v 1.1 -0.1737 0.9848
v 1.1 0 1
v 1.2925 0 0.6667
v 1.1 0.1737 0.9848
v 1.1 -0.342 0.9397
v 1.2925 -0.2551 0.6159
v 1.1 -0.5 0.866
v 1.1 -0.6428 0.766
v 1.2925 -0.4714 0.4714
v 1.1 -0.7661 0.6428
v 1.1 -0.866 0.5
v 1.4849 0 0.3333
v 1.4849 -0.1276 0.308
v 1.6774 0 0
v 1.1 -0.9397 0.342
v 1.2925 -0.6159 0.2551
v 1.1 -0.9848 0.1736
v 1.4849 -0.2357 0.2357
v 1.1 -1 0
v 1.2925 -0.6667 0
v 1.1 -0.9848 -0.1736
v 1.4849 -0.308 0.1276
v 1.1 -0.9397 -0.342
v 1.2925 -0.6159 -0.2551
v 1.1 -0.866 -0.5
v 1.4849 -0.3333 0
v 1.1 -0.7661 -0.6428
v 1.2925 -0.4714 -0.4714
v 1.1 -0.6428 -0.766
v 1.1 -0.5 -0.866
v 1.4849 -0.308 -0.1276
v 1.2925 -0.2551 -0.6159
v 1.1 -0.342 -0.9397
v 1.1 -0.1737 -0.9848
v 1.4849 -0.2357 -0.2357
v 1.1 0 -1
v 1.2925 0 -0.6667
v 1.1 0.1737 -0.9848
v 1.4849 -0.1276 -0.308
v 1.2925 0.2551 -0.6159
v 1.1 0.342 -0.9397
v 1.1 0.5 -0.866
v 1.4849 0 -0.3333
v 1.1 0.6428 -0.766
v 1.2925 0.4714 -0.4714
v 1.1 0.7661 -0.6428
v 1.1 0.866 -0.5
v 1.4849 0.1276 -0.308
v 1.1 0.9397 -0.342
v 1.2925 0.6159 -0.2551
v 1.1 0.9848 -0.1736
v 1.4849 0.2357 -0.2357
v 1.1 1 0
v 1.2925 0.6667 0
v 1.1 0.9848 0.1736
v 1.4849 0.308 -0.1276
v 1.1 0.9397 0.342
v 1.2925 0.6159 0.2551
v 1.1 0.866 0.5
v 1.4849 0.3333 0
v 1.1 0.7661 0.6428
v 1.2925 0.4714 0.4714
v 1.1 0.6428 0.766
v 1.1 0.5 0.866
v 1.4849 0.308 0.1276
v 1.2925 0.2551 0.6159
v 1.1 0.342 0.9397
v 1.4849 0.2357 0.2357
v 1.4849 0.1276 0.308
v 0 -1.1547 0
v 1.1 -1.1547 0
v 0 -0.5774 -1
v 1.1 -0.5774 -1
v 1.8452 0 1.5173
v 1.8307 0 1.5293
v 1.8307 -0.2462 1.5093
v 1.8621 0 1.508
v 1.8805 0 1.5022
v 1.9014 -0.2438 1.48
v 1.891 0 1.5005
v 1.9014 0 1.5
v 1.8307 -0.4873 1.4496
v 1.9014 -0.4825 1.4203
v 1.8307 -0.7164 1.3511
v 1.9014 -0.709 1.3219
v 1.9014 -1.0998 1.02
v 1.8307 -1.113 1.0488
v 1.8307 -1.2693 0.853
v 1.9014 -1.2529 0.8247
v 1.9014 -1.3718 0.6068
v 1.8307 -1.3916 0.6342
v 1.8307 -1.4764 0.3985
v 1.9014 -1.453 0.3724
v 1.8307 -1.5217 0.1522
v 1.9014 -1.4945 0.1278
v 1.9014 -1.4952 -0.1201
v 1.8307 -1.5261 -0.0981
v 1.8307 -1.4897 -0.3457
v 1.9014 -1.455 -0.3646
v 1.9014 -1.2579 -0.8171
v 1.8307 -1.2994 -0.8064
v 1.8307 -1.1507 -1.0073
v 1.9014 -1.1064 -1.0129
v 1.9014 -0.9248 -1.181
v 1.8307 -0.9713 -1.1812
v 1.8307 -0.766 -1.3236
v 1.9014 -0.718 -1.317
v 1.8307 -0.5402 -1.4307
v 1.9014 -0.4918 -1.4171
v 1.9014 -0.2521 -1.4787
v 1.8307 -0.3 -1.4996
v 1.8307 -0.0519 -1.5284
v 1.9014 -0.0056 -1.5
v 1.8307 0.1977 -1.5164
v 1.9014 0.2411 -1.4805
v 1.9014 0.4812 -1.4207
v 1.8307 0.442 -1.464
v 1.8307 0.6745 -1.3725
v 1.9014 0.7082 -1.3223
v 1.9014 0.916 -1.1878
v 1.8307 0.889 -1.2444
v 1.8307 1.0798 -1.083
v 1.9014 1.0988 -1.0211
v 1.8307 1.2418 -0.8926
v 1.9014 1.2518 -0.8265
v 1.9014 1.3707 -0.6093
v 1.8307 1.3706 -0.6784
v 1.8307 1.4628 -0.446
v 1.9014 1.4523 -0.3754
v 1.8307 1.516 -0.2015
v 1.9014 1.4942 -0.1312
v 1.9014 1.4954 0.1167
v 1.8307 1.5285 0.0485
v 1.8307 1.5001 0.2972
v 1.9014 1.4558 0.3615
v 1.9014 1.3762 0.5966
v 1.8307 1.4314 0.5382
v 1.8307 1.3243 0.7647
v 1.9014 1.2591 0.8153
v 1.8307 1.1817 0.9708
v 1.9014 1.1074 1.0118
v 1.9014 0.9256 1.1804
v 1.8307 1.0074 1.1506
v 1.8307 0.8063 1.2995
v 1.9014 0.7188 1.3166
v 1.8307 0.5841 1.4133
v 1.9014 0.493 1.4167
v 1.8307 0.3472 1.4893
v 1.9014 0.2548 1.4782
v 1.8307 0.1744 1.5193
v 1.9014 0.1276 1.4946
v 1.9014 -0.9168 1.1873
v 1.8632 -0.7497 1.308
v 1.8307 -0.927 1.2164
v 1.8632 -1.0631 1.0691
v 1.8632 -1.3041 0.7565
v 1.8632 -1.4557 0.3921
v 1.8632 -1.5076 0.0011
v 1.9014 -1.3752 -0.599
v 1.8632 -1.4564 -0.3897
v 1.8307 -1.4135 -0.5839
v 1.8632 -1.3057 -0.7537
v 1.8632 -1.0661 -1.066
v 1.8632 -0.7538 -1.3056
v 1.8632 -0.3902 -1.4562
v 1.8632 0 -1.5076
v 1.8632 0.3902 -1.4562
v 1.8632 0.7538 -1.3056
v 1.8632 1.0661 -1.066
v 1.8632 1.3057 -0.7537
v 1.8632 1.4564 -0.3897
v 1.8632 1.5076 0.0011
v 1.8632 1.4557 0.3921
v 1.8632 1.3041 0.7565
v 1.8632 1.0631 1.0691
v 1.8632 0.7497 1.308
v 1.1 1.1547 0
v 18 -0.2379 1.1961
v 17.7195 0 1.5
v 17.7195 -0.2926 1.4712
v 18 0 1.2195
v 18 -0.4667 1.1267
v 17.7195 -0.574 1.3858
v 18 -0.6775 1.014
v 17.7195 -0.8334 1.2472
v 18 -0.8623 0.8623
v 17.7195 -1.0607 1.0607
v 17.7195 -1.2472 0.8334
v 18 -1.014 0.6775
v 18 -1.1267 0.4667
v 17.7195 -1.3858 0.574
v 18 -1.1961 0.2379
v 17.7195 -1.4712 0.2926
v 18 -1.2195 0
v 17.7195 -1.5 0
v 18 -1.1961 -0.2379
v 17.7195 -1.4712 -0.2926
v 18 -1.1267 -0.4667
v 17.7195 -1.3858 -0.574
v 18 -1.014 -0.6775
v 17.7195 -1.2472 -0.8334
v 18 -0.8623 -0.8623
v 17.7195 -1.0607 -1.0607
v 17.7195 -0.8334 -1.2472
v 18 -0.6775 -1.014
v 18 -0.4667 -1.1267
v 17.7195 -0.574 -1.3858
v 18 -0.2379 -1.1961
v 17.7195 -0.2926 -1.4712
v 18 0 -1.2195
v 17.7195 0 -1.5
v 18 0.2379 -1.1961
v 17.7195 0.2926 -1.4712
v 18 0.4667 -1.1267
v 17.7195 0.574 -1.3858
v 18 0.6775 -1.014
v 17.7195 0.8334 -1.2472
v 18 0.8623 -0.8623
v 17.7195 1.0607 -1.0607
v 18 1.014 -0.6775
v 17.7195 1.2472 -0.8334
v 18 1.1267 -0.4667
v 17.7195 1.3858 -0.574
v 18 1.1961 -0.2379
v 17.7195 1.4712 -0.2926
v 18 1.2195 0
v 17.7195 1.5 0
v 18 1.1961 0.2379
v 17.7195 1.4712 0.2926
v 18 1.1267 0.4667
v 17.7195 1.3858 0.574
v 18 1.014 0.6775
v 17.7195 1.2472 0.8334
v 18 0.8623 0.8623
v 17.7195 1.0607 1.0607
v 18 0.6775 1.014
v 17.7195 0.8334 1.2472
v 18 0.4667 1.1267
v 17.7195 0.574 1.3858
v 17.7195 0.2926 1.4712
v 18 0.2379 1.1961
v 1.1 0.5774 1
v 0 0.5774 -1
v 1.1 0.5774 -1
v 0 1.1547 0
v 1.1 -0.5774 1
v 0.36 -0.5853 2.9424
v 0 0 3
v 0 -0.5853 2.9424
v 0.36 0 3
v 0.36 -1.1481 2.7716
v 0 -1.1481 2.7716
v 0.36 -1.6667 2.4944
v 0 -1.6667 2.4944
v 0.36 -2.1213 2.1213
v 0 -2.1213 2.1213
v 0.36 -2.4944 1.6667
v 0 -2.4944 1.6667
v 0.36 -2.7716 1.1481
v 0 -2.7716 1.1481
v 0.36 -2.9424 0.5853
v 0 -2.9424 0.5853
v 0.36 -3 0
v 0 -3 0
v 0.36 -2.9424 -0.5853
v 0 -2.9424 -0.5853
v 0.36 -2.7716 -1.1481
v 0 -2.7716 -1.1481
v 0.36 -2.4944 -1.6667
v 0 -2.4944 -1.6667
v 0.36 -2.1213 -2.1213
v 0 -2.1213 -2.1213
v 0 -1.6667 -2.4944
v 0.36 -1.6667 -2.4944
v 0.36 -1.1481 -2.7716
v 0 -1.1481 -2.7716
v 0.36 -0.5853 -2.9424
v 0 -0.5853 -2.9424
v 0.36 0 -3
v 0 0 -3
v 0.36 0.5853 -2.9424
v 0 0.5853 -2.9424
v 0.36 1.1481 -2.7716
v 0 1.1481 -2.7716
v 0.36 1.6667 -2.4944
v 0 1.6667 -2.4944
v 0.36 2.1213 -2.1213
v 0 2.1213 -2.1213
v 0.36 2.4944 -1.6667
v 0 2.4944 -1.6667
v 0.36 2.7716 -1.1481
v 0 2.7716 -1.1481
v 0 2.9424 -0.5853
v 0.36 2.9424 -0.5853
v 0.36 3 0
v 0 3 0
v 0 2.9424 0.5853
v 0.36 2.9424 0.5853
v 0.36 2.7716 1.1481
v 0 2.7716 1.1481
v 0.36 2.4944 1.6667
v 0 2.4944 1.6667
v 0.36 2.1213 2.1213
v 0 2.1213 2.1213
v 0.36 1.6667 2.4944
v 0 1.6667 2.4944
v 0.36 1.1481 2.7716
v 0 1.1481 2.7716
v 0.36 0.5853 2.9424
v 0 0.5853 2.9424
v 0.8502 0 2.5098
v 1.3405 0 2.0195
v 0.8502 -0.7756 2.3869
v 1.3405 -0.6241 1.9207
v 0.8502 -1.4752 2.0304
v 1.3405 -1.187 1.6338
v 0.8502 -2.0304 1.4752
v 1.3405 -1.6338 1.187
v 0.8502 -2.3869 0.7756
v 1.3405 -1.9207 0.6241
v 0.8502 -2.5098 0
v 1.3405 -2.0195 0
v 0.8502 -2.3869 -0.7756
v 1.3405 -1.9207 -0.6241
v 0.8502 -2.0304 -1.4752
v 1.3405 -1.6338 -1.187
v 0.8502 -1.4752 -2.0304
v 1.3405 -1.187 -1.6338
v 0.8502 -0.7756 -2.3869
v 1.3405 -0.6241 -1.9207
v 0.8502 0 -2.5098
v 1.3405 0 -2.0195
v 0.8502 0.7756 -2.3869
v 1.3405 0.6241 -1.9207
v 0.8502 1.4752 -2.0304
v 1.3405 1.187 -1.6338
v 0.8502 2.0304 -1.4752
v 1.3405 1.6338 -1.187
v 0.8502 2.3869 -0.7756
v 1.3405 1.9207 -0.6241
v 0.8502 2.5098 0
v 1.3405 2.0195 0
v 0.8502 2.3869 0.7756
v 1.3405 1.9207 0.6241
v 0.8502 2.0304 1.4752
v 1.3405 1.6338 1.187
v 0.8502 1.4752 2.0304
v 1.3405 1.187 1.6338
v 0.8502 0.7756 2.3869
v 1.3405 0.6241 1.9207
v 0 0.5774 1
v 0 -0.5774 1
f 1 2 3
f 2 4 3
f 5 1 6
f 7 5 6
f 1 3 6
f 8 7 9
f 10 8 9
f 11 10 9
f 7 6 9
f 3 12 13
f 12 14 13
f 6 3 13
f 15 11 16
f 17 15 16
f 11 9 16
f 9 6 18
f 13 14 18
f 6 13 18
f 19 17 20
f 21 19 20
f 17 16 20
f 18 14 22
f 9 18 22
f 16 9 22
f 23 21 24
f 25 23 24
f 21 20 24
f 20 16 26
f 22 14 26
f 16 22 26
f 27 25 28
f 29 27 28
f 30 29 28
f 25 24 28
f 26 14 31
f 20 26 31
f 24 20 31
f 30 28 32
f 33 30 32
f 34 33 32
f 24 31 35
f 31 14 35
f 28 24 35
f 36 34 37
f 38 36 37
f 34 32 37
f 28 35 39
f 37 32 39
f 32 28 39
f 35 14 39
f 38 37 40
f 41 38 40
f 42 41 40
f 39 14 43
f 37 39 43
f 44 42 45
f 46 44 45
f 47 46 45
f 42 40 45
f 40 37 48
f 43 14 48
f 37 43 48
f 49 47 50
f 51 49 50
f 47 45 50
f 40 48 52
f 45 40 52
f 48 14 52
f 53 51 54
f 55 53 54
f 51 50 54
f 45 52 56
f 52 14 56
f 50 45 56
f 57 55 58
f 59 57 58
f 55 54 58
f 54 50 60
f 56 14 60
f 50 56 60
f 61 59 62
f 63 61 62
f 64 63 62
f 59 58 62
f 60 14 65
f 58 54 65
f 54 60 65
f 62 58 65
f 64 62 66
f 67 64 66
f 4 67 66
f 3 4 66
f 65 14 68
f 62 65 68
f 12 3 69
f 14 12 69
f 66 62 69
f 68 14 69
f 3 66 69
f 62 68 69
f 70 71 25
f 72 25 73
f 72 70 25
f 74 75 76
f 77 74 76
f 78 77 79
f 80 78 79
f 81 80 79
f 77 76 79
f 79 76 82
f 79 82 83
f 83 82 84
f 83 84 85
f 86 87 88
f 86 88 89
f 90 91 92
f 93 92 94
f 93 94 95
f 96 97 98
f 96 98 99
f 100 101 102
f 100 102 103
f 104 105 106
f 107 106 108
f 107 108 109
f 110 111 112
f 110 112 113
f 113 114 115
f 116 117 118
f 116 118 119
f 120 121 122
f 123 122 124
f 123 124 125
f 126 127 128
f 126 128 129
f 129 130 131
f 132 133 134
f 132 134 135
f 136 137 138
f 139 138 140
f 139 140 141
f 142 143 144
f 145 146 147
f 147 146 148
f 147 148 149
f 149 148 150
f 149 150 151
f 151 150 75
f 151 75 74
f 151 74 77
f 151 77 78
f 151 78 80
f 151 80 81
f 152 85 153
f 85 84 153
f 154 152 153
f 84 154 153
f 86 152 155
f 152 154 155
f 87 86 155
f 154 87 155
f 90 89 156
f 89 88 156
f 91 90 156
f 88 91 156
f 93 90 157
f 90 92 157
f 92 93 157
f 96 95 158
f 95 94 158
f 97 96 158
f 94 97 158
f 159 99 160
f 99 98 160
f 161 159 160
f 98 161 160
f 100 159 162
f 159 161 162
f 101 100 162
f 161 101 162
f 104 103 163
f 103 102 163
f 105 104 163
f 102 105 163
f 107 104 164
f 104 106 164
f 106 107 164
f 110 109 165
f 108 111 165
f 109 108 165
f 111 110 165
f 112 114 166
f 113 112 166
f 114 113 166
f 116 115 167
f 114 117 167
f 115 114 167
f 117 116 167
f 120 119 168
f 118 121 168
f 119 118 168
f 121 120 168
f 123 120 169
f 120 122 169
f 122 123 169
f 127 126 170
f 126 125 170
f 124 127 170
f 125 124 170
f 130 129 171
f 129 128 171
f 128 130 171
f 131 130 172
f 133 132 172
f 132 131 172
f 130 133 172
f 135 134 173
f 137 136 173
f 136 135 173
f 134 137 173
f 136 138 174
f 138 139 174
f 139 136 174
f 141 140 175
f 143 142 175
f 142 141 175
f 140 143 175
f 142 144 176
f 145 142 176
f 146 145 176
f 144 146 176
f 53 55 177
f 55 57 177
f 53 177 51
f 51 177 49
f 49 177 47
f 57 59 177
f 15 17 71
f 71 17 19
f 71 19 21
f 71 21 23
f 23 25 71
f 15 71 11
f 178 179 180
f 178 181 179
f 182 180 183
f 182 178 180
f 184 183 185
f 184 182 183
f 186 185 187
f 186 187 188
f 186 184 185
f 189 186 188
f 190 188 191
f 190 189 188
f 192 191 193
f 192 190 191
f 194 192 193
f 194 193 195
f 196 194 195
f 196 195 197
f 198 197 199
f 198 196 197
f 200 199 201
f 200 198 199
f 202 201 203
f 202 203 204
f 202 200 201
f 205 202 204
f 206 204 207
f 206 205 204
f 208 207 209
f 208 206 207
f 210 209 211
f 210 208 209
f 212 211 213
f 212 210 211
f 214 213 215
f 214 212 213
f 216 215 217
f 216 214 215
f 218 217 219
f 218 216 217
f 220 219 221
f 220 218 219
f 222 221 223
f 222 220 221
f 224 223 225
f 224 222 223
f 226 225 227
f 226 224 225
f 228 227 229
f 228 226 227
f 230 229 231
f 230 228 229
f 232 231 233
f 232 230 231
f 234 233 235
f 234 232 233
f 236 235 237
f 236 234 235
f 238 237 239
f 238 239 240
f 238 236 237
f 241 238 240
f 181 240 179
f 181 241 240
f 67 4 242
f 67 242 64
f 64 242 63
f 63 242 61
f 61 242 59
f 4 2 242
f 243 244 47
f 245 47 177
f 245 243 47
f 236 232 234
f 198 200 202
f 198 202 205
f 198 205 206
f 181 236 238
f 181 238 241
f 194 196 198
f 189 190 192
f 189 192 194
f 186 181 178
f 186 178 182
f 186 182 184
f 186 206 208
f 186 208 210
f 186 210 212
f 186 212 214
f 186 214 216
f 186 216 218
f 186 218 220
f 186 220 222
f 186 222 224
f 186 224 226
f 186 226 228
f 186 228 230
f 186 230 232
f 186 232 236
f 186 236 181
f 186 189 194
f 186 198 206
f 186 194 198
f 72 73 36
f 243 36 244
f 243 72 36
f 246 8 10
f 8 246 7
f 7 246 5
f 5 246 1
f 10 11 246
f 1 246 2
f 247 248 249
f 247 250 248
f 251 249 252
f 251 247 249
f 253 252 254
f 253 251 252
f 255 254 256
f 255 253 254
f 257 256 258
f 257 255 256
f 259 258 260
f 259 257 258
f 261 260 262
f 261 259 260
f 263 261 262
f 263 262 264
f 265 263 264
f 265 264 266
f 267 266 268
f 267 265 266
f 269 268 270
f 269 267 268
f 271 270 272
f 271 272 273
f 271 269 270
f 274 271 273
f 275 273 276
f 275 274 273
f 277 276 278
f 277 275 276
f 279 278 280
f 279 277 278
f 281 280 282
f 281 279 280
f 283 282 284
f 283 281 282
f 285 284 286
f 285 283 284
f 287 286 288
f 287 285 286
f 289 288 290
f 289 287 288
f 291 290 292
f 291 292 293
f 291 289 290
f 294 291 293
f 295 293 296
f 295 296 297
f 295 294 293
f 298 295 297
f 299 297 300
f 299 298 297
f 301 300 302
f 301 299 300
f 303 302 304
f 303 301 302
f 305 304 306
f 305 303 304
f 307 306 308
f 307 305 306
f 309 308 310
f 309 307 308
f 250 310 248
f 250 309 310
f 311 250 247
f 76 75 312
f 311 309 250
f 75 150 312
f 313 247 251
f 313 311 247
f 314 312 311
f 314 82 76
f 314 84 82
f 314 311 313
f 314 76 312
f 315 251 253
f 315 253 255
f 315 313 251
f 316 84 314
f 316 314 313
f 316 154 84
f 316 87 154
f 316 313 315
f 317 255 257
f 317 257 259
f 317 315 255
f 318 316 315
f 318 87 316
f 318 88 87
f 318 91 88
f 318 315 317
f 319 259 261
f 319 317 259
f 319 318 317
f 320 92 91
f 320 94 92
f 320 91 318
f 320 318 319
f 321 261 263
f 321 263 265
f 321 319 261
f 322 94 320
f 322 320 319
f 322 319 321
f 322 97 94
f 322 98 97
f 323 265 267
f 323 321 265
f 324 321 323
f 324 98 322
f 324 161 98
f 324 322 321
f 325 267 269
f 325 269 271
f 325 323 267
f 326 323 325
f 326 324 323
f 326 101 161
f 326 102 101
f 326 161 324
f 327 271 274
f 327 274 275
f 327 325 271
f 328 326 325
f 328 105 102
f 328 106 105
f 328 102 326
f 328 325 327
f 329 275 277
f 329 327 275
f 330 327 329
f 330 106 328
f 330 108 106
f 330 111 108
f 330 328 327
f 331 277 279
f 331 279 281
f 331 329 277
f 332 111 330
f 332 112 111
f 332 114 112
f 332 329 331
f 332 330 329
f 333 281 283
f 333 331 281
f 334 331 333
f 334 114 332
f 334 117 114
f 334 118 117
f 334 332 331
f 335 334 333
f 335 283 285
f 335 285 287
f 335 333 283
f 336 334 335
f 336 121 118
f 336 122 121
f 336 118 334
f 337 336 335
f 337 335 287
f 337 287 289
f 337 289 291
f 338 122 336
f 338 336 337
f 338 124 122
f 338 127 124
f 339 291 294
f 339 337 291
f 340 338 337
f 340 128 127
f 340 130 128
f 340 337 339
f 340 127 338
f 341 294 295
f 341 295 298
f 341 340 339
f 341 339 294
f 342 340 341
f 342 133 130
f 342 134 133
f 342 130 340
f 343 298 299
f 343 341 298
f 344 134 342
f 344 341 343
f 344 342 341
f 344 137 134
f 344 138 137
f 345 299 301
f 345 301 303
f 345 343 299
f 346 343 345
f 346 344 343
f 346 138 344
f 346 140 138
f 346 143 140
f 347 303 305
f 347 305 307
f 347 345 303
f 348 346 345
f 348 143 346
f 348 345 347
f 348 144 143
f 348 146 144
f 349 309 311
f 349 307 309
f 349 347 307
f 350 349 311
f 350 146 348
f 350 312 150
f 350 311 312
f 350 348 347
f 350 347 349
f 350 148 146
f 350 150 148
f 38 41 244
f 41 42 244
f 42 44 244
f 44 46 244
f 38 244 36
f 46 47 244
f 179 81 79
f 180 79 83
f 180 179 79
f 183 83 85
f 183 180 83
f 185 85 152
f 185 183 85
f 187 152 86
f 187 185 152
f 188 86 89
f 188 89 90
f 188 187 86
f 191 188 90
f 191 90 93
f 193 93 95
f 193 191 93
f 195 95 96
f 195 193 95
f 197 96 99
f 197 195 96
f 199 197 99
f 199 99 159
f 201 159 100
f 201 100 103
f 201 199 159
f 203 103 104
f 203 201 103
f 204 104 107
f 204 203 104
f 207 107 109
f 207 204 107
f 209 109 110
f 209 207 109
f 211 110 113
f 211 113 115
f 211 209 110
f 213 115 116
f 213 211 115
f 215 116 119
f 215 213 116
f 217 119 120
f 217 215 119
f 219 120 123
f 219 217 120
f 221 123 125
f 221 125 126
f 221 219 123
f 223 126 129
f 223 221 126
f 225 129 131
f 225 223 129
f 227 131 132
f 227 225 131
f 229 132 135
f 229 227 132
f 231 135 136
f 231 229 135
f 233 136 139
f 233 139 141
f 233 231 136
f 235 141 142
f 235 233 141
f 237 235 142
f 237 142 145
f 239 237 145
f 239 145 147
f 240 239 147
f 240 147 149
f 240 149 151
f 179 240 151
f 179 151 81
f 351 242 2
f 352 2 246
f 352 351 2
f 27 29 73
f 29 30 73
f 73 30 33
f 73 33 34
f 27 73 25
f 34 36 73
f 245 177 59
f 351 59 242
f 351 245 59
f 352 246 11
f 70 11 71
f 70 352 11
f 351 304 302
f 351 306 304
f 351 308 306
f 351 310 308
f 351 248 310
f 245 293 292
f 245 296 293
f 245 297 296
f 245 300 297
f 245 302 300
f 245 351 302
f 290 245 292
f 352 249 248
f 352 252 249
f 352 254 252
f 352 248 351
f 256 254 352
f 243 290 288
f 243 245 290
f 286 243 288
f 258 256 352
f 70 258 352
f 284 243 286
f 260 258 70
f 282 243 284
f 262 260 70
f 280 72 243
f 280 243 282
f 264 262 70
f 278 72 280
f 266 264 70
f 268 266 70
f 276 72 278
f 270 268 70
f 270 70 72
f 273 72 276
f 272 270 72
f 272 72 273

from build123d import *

# Parameters (mm, degrees)
FILLET1_R   = 0.1
HEX_2_DEPTH = 1.1


with BuildPart() as part:
    # BodySke → BaseBody (revolve)
    with BuildSketch(Plane.XY, mode=Mode.PRIVATE) as basebody_sk:
        Polygon((0, 0), (0, 3), (0.36, 3), (1.86, 1.5), (17.7195, 1.5), (18, 1.2195), (18, 0), align=None)
    revolve(basebody_sk.sketch.rotate(Axis((0, 0, 0), (1, 0, 0)), 90), axis=Axis((0, 0, 0), (1, 0, 0)))

    # Fillet1
    fillet1_edges = [part.edges().sort_by_distance(p)[0] for p in [
        (1.86, 0, -1.5),
    ]]
    fillet(fillet1_edges, radius=FILLET1_R)

    # Sketch2 → PreBroach (revolve, cut)
    with BuildSketch(Plane.XY, mode=Mode.PRIVATE) as prebroach_sk:
        Polygon((0, 1), (1.1, 1), (1.677350269, 0), (0, 0), align=None)
    revolve(prebroach_sk.sketch.rotate(Axis((0, 0, 0), (1, 0, 0)), 90), axis=Axis((0, 0, 0), (1, 0, 0)), mode=Mode.SUBTRACT)

    # Sketch3 → Hex 2 (cut)
    with BuildSketch(Plane.ZY):
        Polygon((-1, -0.577350269), (-1, 0.577350269), (0, 1.154700538), (1, 0.577350269), (1, -0.577350269), (0, -1.154700538), align=None)
    extrude(amount=-HEX_2_DEPTH, mode=Mode.SUBTRACT)


solid = part.part
